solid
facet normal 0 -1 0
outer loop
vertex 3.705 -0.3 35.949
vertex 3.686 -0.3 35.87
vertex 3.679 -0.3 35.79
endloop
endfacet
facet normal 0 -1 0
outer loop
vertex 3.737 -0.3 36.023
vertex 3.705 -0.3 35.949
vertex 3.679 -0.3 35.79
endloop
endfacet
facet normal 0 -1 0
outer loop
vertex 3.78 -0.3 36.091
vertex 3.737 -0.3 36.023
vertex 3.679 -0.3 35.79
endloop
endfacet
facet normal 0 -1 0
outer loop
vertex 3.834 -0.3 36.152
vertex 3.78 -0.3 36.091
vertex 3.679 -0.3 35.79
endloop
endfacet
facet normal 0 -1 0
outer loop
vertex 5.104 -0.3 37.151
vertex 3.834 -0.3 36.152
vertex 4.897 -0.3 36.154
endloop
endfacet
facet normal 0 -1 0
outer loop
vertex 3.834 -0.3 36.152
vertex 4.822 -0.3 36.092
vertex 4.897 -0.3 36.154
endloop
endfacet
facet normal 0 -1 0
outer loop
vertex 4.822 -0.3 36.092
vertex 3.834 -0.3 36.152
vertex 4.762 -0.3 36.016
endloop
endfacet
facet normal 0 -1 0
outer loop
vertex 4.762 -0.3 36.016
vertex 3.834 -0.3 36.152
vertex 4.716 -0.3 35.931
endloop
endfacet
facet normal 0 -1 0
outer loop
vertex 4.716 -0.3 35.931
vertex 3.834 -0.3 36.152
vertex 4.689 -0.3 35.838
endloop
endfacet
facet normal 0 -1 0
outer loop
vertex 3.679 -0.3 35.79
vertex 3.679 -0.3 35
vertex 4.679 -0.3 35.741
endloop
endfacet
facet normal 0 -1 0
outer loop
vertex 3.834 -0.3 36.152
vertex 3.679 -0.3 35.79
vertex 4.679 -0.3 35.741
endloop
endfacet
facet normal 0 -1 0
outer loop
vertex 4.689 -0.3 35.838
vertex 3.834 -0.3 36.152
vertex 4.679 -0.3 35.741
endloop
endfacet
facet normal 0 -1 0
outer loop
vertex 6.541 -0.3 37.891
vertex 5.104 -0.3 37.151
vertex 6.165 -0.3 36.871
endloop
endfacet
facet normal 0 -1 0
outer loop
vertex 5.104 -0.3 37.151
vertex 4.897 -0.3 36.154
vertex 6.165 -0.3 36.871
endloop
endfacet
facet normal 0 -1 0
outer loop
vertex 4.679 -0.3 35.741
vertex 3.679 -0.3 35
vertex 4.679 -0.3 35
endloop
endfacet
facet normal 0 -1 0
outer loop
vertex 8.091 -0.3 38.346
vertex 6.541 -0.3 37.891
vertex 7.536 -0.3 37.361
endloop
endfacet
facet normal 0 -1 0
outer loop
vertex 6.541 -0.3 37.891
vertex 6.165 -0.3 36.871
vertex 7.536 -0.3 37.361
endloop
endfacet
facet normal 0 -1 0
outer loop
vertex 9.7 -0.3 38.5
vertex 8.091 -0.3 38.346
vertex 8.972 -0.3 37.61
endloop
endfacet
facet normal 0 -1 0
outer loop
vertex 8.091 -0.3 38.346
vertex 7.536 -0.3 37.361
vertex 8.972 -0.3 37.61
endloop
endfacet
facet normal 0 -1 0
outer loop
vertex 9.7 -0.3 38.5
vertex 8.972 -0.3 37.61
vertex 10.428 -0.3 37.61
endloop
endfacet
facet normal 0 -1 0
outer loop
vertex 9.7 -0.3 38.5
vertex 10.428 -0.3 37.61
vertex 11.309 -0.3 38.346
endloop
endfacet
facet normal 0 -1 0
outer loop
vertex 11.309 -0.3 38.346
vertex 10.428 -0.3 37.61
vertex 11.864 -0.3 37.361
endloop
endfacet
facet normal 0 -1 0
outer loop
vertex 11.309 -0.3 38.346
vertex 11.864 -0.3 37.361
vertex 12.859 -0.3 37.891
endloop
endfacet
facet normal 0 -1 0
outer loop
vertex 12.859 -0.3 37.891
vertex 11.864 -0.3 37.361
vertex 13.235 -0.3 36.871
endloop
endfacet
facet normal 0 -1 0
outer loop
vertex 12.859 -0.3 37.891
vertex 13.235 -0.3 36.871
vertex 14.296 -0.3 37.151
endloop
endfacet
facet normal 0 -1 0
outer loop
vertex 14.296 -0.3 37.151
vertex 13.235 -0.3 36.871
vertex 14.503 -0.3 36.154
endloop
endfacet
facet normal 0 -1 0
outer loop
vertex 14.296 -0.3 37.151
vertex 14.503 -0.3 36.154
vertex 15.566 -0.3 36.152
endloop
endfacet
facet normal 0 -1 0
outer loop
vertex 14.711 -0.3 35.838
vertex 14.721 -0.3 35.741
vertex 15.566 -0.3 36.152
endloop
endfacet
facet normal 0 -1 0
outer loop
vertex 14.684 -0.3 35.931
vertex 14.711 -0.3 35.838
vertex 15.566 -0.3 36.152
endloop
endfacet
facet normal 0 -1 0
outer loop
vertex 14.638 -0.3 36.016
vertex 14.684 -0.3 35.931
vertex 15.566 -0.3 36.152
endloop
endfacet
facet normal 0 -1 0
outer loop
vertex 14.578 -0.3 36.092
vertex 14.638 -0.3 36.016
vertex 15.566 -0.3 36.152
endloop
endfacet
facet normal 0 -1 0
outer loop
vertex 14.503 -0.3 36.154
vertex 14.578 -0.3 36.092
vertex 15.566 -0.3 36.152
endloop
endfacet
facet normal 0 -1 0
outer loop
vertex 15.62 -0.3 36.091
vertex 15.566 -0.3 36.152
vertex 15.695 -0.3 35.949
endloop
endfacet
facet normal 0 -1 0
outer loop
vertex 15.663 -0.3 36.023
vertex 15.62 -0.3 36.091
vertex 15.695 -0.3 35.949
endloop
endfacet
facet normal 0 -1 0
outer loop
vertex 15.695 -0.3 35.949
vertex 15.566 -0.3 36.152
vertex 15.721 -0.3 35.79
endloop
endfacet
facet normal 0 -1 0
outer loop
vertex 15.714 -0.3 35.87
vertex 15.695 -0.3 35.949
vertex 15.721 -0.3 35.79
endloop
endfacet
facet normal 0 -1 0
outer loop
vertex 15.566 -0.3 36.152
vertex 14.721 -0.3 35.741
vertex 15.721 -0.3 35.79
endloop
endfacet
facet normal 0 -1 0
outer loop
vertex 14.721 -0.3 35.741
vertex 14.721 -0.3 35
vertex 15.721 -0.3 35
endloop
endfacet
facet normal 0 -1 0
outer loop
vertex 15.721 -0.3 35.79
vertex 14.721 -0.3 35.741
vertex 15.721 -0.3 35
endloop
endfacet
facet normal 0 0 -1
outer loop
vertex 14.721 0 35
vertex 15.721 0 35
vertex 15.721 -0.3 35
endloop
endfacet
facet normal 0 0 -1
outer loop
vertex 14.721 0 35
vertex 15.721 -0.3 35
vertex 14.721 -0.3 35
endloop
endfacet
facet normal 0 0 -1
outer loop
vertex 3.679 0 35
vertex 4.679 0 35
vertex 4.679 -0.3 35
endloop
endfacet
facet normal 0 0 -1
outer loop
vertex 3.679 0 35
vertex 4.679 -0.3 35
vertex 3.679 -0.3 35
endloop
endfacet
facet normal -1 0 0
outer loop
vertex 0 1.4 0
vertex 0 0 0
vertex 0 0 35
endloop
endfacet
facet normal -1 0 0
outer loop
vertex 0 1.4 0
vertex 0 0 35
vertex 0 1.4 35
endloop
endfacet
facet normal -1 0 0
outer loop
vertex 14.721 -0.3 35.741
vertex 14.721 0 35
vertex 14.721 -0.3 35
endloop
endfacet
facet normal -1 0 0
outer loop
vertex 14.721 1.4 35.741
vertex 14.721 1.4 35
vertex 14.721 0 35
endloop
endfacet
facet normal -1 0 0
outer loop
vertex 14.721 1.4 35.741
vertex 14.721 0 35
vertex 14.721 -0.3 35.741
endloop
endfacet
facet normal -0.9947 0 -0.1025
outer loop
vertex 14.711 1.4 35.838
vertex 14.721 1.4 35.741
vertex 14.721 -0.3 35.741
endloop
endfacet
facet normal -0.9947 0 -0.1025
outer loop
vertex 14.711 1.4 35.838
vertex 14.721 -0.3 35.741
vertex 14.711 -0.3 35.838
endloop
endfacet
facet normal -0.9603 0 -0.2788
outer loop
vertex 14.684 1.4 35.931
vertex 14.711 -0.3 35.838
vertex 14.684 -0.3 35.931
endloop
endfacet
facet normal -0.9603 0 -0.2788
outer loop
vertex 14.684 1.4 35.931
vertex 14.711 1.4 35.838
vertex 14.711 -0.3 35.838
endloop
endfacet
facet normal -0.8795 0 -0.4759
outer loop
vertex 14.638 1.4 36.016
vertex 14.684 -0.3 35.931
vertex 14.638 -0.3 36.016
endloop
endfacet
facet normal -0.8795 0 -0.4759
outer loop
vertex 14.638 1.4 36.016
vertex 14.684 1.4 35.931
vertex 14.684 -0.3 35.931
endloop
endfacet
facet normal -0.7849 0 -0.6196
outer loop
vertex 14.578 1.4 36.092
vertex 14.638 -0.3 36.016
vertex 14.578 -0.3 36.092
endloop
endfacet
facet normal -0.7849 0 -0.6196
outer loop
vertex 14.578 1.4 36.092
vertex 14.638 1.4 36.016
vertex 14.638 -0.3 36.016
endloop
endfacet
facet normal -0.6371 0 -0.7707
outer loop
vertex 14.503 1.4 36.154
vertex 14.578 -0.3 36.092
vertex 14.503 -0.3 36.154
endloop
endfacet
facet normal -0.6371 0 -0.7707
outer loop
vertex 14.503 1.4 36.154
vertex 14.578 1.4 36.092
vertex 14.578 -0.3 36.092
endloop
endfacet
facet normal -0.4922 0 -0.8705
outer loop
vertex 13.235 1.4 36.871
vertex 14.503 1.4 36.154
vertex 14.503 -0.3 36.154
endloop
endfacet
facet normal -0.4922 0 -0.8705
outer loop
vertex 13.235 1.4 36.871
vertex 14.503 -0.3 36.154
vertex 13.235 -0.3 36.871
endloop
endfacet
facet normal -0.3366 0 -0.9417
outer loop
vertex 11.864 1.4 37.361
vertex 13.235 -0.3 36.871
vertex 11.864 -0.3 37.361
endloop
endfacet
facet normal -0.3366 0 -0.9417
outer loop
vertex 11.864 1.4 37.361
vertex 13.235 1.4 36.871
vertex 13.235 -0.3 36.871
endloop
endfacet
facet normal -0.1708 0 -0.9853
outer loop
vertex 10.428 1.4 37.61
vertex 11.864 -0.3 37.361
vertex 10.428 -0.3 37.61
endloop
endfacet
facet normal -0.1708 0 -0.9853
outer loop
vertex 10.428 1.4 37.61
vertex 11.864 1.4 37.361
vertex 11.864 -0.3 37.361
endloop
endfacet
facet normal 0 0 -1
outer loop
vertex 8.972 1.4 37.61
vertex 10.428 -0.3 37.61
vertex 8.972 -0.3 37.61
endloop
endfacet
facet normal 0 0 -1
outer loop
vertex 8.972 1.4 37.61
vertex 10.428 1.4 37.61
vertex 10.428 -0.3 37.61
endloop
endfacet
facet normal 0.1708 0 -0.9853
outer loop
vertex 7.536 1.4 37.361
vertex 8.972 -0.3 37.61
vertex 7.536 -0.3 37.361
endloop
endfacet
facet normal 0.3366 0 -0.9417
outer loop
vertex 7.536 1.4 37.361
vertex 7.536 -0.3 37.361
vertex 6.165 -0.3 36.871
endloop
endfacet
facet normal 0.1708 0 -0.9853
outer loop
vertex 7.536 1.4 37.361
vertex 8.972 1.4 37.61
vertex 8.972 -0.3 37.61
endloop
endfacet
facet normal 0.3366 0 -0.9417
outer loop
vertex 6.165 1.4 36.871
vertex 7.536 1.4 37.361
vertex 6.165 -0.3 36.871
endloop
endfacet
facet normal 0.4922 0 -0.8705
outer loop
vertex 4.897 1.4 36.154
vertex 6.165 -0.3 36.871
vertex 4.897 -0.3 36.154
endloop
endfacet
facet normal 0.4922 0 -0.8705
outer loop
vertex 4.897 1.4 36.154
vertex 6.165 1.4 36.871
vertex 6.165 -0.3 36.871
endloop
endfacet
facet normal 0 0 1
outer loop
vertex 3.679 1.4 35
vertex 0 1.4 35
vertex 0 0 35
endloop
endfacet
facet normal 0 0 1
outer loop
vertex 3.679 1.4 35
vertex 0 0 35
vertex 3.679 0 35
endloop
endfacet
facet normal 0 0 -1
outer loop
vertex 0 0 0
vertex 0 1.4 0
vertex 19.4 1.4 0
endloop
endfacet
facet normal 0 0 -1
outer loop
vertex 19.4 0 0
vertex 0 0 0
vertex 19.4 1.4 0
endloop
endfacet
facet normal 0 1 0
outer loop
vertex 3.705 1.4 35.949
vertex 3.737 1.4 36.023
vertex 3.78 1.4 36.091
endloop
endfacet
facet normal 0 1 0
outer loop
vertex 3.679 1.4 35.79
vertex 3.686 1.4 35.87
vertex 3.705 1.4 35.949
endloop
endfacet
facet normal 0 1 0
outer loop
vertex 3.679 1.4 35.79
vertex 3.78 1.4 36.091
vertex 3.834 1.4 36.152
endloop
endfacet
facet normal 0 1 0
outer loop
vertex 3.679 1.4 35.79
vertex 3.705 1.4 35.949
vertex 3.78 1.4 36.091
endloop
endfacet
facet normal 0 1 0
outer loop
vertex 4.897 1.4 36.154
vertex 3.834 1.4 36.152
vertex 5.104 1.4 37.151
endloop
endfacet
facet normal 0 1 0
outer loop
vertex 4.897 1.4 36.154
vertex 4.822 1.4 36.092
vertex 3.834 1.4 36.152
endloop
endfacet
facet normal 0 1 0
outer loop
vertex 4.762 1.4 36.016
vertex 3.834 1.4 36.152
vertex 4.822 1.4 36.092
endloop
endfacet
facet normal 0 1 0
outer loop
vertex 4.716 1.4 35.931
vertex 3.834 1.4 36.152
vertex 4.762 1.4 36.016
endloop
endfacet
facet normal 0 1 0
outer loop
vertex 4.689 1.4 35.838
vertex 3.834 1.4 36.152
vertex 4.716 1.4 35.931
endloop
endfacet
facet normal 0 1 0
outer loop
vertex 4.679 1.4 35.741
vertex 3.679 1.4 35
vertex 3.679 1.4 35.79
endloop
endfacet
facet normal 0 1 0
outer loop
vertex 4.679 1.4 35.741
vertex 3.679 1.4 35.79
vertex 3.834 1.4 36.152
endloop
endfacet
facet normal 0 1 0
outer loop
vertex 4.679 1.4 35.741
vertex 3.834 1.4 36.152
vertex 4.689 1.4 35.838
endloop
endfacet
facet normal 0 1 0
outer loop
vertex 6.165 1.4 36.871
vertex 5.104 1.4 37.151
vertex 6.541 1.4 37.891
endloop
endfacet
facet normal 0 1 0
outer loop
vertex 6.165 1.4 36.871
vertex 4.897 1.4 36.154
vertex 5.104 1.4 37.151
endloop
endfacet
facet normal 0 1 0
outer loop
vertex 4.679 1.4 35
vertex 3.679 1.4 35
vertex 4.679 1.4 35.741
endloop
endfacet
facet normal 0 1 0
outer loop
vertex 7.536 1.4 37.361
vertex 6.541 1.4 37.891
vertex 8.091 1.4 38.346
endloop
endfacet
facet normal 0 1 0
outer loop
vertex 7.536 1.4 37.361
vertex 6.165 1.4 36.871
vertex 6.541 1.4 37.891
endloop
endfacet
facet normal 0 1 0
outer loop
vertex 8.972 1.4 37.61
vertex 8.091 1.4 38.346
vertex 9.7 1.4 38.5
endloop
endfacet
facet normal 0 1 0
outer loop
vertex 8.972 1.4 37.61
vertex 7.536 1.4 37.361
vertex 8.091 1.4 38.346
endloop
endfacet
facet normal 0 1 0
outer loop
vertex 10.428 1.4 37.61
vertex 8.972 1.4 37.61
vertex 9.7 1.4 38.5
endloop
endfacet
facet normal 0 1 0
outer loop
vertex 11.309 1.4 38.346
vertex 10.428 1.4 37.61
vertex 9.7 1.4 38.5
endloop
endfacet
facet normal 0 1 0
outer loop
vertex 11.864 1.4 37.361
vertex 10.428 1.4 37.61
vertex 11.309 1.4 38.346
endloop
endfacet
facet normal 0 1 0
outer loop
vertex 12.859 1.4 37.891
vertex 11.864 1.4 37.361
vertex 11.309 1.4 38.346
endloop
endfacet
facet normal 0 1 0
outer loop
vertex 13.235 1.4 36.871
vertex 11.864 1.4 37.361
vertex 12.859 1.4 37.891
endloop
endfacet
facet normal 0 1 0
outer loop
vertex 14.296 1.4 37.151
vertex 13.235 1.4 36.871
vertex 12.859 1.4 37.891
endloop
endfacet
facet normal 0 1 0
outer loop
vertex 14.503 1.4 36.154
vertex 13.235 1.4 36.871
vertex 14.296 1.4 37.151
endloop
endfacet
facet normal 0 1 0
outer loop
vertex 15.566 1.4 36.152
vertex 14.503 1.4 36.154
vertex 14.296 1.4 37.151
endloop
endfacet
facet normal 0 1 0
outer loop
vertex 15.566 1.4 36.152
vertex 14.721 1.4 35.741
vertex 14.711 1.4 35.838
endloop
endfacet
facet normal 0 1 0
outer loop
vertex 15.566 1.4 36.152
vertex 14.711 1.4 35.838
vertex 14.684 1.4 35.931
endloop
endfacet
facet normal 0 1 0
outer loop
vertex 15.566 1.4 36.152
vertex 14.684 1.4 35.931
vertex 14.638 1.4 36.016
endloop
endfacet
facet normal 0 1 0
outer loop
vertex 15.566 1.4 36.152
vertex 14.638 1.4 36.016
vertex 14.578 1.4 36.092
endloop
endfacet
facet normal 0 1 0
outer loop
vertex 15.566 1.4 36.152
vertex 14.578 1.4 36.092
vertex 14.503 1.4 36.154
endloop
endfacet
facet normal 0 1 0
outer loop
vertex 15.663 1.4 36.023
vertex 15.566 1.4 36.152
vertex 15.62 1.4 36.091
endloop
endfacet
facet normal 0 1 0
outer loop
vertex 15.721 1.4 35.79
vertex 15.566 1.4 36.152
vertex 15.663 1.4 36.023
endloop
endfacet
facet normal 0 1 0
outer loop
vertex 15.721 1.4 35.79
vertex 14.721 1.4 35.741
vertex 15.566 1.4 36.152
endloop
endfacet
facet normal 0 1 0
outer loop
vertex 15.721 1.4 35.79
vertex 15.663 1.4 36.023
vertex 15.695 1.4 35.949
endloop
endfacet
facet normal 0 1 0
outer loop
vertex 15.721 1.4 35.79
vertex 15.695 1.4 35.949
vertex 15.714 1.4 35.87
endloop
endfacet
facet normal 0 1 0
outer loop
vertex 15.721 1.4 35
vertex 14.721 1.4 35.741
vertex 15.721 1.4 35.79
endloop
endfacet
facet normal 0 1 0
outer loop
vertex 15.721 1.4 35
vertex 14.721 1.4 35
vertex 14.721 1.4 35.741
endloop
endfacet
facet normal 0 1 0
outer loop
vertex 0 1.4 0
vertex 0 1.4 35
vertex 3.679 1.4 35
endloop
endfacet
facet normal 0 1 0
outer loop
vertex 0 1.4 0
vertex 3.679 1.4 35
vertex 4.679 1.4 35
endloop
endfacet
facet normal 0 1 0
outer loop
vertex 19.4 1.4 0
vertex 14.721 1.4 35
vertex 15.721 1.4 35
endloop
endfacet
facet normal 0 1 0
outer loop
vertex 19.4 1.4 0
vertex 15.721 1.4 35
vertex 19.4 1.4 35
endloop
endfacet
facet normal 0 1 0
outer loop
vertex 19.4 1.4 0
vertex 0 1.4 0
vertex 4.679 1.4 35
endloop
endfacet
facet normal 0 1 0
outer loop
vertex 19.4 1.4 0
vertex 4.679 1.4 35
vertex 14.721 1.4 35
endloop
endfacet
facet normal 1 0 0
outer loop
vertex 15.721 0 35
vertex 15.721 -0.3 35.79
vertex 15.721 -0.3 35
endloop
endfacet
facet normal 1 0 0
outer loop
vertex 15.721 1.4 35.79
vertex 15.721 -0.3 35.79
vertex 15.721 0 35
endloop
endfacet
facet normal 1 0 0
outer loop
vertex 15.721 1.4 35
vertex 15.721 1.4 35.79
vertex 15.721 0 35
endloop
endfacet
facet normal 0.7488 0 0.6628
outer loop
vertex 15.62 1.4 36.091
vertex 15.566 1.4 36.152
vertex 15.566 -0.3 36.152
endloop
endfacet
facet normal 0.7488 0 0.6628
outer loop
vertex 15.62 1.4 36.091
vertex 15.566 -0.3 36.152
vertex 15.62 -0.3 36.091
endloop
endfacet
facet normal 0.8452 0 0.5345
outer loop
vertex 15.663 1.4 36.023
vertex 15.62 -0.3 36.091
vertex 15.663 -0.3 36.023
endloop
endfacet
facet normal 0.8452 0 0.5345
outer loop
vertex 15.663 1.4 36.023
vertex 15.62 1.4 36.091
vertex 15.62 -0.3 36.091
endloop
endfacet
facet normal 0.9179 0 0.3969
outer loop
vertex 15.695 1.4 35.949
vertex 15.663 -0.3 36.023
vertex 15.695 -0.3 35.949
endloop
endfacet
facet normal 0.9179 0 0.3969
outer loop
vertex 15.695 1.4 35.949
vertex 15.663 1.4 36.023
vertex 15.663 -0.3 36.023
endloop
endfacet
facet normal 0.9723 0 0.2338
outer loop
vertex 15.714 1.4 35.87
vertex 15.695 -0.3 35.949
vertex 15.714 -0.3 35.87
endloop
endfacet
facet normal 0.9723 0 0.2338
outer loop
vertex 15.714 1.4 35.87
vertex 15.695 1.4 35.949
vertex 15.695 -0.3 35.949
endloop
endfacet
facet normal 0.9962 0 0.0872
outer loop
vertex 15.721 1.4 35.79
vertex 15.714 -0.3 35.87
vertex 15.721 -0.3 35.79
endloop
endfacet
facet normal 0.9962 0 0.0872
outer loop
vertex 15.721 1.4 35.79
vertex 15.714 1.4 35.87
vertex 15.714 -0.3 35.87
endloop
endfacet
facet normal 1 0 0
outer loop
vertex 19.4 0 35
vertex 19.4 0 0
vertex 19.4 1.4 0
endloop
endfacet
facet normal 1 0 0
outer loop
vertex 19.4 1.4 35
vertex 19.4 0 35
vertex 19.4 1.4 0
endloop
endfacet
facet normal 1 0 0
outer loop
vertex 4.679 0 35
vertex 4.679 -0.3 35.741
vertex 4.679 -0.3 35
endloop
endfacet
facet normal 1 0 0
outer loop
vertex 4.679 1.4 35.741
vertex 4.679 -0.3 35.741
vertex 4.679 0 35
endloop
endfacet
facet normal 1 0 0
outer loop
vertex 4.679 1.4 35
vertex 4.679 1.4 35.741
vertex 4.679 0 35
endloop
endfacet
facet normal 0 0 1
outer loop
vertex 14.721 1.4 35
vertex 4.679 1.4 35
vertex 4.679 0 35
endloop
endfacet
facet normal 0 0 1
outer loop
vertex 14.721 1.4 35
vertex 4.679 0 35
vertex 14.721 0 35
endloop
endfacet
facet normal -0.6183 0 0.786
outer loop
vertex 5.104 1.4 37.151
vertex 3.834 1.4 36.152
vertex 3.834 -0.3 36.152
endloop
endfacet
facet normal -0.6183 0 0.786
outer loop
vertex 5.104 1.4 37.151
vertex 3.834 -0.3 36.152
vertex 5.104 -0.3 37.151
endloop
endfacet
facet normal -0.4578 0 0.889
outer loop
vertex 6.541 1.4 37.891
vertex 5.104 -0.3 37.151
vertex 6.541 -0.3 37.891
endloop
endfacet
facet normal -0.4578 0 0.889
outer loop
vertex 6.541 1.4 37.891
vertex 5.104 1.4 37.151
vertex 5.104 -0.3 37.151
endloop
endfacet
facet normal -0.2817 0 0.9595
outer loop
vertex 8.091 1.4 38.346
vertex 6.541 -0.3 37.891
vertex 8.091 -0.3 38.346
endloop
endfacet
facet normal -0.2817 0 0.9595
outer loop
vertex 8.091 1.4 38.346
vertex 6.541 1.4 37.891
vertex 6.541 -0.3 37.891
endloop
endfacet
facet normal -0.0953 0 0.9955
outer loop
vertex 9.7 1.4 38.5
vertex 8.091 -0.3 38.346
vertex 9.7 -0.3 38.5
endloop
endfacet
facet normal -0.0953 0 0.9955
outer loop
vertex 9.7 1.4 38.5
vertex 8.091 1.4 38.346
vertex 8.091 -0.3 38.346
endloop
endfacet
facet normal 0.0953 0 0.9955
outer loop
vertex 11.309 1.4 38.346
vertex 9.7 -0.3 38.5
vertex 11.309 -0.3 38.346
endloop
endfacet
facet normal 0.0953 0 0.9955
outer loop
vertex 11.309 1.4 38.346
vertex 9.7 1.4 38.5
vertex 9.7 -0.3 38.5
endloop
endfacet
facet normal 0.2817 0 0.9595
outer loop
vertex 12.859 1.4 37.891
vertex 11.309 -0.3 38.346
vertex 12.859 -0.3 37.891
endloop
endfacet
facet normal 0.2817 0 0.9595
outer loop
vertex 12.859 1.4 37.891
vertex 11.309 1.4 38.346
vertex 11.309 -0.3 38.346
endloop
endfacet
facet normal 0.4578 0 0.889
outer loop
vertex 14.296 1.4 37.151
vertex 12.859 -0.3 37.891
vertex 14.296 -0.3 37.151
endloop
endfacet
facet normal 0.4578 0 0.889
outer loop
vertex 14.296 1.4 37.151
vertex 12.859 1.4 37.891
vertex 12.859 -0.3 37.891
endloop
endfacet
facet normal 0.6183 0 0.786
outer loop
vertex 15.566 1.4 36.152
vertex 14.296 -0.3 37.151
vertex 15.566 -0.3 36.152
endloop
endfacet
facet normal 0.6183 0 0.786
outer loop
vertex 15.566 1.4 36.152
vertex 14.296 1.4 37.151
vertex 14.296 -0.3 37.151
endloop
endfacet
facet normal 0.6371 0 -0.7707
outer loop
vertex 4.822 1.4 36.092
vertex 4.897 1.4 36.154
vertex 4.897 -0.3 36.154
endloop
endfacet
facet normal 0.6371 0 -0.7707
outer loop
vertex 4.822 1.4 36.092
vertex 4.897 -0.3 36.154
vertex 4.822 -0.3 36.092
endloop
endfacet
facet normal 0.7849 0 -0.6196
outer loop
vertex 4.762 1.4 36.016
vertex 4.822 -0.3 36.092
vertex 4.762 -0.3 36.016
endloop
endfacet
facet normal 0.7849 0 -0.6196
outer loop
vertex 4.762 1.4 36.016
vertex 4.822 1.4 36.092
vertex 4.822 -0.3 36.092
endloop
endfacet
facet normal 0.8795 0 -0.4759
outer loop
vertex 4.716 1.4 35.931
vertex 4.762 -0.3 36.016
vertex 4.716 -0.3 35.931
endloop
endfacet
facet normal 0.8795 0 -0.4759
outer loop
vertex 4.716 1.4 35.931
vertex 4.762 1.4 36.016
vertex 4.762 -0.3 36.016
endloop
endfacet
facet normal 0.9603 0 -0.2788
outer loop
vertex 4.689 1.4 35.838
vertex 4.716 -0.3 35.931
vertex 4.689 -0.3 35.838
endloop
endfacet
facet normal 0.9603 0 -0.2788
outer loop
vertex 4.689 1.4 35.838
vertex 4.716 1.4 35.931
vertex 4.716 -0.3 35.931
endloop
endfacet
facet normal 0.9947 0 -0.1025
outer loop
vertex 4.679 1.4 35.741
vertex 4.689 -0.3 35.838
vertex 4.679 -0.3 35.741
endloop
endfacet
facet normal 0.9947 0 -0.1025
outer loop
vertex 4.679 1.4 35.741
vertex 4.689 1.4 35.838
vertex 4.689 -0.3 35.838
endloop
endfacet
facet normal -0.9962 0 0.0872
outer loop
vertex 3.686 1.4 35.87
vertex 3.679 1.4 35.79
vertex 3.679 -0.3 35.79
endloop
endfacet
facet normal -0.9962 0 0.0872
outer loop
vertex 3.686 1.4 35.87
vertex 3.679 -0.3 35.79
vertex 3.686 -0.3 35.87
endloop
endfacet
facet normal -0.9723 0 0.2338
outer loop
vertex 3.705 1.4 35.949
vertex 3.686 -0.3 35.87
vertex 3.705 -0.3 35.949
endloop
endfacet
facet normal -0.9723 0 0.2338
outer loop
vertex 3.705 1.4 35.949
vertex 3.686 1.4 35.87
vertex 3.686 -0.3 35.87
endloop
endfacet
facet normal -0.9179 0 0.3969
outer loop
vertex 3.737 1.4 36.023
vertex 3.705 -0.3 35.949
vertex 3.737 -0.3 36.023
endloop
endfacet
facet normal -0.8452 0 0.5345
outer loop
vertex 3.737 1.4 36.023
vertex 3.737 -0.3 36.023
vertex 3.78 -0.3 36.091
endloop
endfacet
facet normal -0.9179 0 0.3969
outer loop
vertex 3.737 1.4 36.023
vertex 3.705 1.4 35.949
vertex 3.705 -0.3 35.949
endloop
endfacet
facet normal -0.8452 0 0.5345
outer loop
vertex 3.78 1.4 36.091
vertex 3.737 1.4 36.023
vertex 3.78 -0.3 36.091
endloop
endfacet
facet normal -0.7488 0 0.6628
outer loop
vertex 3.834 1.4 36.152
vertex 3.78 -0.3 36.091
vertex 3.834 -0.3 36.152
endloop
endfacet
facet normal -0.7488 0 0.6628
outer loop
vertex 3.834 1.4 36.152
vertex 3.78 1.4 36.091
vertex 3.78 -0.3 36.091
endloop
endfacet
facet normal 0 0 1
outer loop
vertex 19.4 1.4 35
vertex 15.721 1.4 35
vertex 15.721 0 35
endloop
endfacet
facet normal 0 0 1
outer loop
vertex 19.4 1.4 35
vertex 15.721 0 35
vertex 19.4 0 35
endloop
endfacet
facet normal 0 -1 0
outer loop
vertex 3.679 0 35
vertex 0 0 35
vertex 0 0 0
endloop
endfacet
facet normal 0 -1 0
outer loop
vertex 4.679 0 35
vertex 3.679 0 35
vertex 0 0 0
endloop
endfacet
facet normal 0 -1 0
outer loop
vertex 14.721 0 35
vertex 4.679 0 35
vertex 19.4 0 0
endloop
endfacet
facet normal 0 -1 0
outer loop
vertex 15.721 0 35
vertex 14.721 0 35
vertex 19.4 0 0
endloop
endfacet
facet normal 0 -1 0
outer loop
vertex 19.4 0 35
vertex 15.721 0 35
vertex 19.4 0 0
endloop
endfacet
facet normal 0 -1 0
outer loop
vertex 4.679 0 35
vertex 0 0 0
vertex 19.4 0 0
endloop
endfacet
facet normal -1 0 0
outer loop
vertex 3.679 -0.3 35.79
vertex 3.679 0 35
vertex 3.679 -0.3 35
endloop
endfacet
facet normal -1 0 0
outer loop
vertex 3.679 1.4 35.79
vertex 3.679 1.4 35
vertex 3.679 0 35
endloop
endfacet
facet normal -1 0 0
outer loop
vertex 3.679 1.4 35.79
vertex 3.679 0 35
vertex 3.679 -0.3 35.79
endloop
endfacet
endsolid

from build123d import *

# Parameters (mm, degrees)
SKETCH1_W           = 19.4
SKETCH1_H           = 1.4
BOSS_EXTRUDE1_DEPTH = 35
BOSS_EXTRUDE2_DEPTH = 1.7


with BuildPart() as part:
    # Sketch1 → Boss-Extrude1 (new body)
    with BuildSketch(Plane.XY):
        with Locations((9.7, 0.7)):
            Rectangle(SKETCH1_W, SKETCH1_H)
    extrude(amount=BOSS_EXTRUDE1_DEPTH)

    # Sketch3 → Boss-Extrude2 (add)
    with BuildSketch(Plane(origin=(0, 1.4, 0), x_dir=(1, 0, 0), z_dir=(0, 1, 0))):
        with BuildLine():
            Line((3.679202711, -35), (3.679202711, -35.789714785))
            ThreePointArc((3.679202711, -35.789714785), (3.719569751, -35.986533337), (3.83415288, -36.151571959))
            ThreePointArc((3.83415288, -36.151571959), (9.7, -38.5), (15.56584712, -36.151571959))
            ThreePointArc((15.56584712, -36.151571959), (15.680430249, -35.986533337), (15.720797289, -35.789714785))
            Line((15.720797289, -35.789714785), (15.720797289, -35))
            Line((15.720797289, -35), (14.720797289, -35))
            Line((14.720797289, -35), (14.720797289, -35.741493674))
            ThreePointArc((14.720797289, -35.741493674), (14.663106522, -35.974651436), (14.50334712, -36.154004999))
            ThreePointArc((14.50334712, -36.154004999), (9.7, -37.641312474), (4.89665288, -36.154004999))
            ThreePointArc((4.89665288, -36.154004999), (4.736893478, -35.974651436), (4.679202711, -35.741493674))
            Line((4.679202711, -35.741493674), (4.679202711, -35))
            Line((4.679202711, -35), (3.679202711, -35))
        make_face()
    extrude(amount=-BOSS_EXTRUDE2_DEPTH)


solid = part.part
